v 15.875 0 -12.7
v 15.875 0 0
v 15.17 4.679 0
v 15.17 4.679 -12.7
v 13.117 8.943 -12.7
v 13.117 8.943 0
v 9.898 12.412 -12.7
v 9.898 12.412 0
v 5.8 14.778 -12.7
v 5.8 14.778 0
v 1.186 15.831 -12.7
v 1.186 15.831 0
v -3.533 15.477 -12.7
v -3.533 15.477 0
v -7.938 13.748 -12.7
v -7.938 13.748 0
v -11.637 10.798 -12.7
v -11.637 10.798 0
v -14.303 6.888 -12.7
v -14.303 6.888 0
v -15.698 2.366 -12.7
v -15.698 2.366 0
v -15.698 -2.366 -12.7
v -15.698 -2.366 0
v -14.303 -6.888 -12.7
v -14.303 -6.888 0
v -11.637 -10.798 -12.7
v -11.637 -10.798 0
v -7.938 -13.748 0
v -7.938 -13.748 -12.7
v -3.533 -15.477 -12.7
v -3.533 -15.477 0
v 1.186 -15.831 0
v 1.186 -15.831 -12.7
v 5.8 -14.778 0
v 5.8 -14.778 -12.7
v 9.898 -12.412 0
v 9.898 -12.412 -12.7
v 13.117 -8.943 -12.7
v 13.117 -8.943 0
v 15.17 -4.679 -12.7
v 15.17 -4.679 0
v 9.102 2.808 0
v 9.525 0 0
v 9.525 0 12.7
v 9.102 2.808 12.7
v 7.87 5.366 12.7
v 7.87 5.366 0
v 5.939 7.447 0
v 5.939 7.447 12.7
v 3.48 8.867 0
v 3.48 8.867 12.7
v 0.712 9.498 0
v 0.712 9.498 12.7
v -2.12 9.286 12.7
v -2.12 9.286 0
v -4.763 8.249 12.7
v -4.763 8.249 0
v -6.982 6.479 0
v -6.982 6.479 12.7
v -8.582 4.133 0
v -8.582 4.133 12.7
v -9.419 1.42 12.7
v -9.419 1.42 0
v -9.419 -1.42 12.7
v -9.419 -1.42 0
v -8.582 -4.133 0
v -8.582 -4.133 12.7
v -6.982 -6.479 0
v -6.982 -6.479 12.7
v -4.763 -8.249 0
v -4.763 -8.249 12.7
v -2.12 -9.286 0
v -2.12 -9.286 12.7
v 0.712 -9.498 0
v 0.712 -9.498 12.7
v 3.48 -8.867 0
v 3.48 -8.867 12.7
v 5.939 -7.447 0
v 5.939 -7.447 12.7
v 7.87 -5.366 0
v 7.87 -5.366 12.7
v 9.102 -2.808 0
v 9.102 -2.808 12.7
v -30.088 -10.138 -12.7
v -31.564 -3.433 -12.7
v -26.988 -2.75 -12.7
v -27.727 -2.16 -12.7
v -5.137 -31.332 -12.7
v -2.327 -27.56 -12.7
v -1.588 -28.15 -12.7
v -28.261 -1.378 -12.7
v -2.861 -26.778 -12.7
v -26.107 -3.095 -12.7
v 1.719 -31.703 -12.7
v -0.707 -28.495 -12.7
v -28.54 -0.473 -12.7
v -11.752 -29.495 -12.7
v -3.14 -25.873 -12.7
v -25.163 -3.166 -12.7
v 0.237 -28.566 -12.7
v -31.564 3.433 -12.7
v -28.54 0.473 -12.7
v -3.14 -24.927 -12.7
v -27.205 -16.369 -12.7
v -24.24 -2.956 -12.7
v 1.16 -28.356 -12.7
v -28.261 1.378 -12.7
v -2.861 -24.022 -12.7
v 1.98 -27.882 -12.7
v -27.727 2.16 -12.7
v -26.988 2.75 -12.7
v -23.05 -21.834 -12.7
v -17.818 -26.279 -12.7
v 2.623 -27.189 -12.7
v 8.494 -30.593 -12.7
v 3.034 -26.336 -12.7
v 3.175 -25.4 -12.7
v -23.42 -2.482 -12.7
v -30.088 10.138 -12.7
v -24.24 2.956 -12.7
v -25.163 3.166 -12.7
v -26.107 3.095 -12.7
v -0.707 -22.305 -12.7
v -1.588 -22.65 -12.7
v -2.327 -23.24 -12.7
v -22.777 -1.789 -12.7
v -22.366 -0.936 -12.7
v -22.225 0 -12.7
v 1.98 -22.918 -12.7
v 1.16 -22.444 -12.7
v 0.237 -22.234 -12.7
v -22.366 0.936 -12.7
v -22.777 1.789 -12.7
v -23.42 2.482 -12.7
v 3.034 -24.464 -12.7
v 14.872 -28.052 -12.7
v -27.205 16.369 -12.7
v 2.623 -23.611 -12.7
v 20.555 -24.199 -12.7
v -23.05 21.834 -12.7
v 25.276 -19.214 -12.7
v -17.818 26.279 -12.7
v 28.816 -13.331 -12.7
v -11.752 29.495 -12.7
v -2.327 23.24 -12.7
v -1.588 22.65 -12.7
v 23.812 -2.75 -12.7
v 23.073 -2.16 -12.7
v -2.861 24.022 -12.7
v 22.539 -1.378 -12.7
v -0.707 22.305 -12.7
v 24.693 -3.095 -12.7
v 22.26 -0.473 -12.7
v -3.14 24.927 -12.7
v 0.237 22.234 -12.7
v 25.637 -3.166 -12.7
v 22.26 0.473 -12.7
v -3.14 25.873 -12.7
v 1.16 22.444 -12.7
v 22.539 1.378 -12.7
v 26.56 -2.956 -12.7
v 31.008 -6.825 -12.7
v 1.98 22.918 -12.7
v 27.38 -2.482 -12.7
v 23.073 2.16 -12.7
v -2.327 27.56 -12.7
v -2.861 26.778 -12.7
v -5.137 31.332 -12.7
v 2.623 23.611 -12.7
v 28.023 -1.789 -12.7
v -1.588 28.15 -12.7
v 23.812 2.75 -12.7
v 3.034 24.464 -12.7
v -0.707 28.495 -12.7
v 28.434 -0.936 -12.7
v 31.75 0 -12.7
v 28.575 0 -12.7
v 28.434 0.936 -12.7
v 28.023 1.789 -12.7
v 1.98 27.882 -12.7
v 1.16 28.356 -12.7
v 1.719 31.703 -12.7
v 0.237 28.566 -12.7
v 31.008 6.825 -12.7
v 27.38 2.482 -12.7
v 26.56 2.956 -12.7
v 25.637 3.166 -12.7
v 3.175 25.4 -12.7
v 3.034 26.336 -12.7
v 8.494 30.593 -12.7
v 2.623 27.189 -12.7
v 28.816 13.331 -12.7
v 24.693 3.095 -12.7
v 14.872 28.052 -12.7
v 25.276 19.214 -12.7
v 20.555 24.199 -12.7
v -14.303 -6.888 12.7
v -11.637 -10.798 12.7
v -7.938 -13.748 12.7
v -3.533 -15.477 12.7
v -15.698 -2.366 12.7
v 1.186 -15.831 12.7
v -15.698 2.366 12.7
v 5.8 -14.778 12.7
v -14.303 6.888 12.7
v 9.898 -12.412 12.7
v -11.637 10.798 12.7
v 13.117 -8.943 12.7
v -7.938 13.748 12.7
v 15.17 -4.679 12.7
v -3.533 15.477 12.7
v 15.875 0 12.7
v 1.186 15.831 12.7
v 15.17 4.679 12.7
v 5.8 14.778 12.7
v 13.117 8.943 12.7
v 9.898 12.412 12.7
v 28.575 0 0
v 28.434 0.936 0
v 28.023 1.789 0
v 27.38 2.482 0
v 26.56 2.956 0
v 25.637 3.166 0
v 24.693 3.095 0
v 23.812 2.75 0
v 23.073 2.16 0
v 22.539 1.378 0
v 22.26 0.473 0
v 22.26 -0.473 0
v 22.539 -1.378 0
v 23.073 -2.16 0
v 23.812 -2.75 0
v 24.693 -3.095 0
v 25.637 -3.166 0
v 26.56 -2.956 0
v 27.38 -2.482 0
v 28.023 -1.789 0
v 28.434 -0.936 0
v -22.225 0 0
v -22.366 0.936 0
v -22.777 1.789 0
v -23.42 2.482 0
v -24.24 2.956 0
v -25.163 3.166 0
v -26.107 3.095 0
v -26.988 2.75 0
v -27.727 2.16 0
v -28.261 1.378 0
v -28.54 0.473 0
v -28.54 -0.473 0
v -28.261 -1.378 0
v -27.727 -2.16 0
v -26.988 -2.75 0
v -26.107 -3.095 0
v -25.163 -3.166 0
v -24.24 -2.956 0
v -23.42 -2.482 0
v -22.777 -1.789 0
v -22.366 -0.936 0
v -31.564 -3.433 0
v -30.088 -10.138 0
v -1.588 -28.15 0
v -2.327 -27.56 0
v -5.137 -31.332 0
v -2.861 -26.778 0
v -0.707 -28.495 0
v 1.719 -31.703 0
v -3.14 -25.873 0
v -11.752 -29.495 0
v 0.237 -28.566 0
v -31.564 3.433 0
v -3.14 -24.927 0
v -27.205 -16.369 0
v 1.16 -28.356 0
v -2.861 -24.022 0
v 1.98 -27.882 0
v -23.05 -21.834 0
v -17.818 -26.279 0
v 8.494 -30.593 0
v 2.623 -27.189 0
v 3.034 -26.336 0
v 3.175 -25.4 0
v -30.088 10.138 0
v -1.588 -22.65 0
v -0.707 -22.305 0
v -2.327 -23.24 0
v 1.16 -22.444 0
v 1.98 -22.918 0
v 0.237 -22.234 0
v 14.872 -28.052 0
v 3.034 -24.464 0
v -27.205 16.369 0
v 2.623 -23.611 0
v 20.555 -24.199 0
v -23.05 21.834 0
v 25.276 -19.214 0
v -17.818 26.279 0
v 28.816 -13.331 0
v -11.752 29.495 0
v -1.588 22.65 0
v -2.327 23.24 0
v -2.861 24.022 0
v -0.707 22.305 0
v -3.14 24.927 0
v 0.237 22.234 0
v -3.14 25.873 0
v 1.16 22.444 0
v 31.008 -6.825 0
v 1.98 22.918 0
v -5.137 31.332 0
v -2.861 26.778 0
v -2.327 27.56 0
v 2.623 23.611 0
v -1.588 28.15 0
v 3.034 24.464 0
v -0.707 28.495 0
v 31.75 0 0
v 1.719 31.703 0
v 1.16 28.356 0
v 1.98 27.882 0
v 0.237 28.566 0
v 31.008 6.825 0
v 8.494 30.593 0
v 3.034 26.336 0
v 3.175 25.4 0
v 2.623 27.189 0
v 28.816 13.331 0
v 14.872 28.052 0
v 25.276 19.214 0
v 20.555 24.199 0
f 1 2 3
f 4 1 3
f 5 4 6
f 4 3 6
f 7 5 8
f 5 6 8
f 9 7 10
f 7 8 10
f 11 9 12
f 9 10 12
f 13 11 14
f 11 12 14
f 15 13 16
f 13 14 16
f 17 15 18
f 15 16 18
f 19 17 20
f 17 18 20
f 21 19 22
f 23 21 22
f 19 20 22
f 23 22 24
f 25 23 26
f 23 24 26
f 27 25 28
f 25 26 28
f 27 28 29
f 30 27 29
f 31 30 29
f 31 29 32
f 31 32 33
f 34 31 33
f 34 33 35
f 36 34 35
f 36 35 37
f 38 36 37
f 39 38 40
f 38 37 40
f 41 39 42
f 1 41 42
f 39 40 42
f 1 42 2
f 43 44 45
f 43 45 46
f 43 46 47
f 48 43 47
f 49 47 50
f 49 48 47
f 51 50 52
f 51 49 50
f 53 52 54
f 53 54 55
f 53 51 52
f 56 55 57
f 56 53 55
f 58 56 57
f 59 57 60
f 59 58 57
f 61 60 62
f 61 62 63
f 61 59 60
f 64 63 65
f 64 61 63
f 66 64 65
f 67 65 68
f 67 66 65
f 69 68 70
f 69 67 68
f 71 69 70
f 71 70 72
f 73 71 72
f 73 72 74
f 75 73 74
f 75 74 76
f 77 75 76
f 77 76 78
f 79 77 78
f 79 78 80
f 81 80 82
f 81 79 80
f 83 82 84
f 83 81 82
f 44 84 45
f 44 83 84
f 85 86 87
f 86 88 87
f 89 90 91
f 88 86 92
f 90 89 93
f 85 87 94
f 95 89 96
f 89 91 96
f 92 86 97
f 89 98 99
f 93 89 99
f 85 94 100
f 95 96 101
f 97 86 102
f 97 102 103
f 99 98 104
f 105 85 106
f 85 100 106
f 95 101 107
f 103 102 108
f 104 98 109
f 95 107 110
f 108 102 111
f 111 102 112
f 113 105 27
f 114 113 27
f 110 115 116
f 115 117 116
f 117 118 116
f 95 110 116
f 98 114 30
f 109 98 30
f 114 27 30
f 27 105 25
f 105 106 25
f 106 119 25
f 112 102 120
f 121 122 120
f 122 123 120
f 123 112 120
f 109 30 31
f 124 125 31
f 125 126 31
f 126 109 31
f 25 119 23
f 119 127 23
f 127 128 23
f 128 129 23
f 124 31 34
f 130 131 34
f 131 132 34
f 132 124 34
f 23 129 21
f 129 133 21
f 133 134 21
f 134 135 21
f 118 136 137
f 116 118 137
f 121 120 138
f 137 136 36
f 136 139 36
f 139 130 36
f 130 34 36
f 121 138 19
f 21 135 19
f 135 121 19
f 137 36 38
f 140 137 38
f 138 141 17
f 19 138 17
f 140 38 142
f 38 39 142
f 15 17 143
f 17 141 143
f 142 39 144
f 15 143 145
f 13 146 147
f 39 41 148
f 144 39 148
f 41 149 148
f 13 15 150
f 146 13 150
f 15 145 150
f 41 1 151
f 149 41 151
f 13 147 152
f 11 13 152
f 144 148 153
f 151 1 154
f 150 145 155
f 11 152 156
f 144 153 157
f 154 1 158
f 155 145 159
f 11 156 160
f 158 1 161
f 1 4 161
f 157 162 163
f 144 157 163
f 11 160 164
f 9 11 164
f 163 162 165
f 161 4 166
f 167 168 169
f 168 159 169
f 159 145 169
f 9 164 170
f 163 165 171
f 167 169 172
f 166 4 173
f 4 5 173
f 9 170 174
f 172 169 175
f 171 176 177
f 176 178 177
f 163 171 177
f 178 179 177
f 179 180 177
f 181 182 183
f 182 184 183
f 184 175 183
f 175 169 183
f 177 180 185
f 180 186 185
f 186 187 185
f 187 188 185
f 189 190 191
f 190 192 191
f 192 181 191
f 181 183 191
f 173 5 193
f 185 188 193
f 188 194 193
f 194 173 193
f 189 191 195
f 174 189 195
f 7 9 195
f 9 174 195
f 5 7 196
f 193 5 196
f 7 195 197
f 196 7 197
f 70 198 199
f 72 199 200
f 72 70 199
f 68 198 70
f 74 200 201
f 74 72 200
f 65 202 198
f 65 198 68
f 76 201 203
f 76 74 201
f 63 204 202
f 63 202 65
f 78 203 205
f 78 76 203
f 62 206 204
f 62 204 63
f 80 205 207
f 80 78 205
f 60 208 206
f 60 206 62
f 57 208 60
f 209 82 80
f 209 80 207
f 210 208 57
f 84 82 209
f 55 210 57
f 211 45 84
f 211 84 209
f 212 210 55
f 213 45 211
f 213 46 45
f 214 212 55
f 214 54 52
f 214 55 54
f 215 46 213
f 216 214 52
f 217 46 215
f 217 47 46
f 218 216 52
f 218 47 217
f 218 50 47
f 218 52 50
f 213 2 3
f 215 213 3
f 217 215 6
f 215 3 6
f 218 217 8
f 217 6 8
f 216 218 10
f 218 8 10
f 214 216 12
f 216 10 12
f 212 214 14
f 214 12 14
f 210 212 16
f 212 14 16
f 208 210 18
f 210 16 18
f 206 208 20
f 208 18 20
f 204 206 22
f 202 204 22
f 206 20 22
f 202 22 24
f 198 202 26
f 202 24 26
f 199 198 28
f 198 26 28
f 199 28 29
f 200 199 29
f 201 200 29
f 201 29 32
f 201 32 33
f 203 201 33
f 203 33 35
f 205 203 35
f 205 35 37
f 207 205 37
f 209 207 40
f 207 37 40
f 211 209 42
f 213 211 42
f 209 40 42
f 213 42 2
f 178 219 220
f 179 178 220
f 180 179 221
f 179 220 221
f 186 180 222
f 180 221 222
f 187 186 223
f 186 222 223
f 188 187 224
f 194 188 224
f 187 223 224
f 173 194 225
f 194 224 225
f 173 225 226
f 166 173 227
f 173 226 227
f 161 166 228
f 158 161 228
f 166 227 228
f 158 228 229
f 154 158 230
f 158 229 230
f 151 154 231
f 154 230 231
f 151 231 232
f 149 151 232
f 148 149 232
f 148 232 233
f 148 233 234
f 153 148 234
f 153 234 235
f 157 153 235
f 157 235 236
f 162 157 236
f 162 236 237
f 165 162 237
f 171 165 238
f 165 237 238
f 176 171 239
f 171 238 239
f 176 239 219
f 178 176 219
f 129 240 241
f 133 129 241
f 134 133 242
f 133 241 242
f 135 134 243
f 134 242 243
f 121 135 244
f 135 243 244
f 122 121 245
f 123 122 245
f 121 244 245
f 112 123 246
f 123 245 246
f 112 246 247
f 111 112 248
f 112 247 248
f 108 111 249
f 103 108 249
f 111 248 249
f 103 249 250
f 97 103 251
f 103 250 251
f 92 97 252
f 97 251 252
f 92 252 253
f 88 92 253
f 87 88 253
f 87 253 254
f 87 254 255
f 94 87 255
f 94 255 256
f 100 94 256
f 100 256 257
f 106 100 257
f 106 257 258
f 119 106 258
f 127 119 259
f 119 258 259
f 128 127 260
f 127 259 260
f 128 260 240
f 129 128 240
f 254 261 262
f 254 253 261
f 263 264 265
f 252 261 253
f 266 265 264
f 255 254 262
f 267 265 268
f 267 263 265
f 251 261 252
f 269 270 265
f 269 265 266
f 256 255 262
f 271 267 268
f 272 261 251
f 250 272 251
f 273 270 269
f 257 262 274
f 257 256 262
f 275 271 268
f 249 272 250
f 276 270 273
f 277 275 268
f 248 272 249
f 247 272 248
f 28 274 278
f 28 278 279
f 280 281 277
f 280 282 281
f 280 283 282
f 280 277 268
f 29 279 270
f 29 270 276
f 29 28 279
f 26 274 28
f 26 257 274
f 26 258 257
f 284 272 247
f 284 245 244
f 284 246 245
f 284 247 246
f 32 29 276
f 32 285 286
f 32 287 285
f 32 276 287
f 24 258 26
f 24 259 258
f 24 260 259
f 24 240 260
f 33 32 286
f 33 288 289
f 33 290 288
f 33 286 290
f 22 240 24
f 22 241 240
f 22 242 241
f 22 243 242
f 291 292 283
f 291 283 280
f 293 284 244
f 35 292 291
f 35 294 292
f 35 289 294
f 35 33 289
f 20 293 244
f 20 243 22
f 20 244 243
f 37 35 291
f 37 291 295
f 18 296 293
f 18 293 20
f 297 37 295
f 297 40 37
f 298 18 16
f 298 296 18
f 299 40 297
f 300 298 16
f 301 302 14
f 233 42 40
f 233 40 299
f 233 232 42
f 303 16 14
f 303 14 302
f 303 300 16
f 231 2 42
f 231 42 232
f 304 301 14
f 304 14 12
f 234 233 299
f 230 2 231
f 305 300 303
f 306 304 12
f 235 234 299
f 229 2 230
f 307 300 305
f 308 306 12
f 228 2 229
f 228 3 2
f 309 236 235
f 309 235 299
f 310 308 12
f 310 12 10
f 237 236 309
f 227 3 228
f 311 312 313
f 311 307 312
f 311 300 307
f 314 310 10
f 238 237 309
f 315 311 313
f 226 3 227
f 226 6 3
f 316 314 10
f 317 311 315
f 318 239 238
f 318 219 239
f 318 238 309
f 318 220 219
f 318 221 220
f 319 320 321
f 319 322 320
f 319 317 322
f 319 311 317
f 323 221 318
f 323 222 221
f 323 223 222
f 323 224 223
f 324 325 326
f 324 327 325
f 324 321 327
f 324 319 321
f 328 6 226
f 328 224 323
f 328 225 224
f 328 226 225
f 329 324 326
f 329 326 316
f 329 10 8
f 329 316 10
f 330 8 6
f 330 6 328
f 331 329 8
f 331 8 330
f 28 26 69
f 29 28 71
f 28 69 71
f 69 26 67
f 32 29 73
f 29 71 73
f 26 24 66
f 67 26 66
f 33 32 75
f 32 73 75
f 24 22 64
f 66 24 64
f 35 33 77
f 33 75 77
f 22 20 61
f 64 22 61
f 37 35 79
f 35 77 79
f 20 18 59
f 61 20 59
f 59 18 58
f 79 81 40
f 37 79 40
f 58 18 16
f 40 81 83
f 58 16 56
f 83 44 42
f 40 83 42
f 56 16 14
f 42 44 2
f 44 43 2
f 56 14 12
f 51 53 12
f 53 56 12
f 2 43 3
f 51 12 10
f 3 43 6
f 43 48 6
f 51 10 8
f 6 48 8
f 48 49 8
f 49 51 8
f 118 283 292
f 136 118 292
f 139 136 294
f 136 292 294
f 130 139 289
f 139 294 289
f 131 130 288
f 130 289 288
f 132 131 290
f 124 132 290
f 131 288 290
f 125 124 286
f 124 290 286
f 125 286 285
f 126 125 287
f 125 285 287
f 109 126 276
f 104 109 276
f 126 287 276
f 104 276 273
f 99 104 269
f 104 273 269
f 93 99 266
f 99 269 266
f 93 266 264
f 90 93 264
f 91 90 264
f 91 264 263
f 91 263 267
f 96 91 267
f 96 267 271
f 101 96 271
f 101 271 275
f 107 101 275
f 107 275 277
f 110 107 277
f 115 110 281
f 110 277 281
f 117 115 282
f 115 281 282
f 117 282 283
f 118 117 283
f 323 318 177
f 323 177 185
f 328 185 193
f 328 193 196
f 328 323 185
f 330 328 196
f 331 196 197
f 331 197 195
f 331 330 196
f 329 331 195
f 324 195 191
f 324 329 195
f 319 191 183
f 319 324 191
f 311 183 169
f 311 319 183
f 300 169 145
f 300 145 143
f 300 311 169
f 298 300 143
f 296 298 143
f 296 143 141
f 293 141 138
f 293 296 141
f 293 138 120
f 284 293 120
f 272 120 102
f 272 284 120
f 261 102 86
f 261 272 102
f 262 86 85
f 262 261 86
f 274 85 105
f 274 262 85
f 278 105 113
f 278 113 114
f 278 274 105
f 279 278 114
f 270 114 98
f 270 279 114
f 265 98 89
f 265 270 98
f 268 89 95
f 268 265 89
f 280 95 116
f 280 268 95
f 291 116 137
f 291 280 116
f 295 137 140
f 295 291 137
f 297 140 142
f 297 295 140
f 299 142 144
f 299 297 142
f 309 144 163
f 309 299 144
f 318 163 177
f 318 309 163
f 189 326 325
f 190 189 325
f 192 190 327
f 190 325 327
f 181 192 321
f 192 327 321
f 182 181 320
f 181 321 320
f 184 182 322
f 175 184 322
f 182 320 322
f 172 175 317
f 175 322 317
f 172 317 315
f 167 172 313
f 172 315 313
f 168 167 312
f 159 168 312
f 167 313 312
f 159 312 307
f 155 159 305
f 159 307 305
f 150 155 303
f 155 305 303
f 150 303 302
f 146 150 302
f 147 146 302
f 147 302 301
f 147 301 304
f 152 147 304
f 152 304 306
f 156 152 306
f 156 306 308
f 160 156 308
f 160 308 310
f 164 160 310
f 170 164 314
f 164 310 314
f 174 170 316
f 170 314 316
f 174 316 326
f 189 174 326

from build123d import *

# Parameters (mm, degrees)
F0_R     = 31.75
F0_R_2   = 3.175
F0_R_3   = 15.875
F1_DEPTH = 12.7
F0_R_4   = 9.525
F2_DEPTH = 12.7
F3_DEPTH = 12.701


with BuildPart() as f1:
    # F0 (on Top) → F1 (new body)
    with BuildSketch(Plane.XY):
        Circle(F0_R)
        with Locations((0, -25.4)):
            Circle(F0_R_2, mode=Mode.SUBTRACT)
        with Locations((-25.4, 0)):
            Circle(F0_R_2, mode=Mode.SUBTRACT)
        Circle(F0_R_3, mode=Mode.SUBTRACT)
        with Locations((25.4, 0)):
            Circle(F0_R_2, mode=Mode.SUBTRACT)
        with Locations((0, 25.4)):
            Circle(F0_R_2, mode=Mode.SUBTRACT)
    extrude(amount=-F1_DEPTH)

    # F0 (on Top) → F2 (join)
    with BuildSketch(Plane.XY):
        Circle(F0_R_3)
        Circle(F0_R_4, mode=Mode.SUBTRACT)
    extrude(amount=F2_DEPTH)

    # F0 (on Top) → F3 (cut, through all)
    with BuildSketch(Plane.XY):
        Circle(F0_R_4)
    extrude(amount=-F3_DEPTH, mode=Mode.SUBTRACT)


solid = f1.part
